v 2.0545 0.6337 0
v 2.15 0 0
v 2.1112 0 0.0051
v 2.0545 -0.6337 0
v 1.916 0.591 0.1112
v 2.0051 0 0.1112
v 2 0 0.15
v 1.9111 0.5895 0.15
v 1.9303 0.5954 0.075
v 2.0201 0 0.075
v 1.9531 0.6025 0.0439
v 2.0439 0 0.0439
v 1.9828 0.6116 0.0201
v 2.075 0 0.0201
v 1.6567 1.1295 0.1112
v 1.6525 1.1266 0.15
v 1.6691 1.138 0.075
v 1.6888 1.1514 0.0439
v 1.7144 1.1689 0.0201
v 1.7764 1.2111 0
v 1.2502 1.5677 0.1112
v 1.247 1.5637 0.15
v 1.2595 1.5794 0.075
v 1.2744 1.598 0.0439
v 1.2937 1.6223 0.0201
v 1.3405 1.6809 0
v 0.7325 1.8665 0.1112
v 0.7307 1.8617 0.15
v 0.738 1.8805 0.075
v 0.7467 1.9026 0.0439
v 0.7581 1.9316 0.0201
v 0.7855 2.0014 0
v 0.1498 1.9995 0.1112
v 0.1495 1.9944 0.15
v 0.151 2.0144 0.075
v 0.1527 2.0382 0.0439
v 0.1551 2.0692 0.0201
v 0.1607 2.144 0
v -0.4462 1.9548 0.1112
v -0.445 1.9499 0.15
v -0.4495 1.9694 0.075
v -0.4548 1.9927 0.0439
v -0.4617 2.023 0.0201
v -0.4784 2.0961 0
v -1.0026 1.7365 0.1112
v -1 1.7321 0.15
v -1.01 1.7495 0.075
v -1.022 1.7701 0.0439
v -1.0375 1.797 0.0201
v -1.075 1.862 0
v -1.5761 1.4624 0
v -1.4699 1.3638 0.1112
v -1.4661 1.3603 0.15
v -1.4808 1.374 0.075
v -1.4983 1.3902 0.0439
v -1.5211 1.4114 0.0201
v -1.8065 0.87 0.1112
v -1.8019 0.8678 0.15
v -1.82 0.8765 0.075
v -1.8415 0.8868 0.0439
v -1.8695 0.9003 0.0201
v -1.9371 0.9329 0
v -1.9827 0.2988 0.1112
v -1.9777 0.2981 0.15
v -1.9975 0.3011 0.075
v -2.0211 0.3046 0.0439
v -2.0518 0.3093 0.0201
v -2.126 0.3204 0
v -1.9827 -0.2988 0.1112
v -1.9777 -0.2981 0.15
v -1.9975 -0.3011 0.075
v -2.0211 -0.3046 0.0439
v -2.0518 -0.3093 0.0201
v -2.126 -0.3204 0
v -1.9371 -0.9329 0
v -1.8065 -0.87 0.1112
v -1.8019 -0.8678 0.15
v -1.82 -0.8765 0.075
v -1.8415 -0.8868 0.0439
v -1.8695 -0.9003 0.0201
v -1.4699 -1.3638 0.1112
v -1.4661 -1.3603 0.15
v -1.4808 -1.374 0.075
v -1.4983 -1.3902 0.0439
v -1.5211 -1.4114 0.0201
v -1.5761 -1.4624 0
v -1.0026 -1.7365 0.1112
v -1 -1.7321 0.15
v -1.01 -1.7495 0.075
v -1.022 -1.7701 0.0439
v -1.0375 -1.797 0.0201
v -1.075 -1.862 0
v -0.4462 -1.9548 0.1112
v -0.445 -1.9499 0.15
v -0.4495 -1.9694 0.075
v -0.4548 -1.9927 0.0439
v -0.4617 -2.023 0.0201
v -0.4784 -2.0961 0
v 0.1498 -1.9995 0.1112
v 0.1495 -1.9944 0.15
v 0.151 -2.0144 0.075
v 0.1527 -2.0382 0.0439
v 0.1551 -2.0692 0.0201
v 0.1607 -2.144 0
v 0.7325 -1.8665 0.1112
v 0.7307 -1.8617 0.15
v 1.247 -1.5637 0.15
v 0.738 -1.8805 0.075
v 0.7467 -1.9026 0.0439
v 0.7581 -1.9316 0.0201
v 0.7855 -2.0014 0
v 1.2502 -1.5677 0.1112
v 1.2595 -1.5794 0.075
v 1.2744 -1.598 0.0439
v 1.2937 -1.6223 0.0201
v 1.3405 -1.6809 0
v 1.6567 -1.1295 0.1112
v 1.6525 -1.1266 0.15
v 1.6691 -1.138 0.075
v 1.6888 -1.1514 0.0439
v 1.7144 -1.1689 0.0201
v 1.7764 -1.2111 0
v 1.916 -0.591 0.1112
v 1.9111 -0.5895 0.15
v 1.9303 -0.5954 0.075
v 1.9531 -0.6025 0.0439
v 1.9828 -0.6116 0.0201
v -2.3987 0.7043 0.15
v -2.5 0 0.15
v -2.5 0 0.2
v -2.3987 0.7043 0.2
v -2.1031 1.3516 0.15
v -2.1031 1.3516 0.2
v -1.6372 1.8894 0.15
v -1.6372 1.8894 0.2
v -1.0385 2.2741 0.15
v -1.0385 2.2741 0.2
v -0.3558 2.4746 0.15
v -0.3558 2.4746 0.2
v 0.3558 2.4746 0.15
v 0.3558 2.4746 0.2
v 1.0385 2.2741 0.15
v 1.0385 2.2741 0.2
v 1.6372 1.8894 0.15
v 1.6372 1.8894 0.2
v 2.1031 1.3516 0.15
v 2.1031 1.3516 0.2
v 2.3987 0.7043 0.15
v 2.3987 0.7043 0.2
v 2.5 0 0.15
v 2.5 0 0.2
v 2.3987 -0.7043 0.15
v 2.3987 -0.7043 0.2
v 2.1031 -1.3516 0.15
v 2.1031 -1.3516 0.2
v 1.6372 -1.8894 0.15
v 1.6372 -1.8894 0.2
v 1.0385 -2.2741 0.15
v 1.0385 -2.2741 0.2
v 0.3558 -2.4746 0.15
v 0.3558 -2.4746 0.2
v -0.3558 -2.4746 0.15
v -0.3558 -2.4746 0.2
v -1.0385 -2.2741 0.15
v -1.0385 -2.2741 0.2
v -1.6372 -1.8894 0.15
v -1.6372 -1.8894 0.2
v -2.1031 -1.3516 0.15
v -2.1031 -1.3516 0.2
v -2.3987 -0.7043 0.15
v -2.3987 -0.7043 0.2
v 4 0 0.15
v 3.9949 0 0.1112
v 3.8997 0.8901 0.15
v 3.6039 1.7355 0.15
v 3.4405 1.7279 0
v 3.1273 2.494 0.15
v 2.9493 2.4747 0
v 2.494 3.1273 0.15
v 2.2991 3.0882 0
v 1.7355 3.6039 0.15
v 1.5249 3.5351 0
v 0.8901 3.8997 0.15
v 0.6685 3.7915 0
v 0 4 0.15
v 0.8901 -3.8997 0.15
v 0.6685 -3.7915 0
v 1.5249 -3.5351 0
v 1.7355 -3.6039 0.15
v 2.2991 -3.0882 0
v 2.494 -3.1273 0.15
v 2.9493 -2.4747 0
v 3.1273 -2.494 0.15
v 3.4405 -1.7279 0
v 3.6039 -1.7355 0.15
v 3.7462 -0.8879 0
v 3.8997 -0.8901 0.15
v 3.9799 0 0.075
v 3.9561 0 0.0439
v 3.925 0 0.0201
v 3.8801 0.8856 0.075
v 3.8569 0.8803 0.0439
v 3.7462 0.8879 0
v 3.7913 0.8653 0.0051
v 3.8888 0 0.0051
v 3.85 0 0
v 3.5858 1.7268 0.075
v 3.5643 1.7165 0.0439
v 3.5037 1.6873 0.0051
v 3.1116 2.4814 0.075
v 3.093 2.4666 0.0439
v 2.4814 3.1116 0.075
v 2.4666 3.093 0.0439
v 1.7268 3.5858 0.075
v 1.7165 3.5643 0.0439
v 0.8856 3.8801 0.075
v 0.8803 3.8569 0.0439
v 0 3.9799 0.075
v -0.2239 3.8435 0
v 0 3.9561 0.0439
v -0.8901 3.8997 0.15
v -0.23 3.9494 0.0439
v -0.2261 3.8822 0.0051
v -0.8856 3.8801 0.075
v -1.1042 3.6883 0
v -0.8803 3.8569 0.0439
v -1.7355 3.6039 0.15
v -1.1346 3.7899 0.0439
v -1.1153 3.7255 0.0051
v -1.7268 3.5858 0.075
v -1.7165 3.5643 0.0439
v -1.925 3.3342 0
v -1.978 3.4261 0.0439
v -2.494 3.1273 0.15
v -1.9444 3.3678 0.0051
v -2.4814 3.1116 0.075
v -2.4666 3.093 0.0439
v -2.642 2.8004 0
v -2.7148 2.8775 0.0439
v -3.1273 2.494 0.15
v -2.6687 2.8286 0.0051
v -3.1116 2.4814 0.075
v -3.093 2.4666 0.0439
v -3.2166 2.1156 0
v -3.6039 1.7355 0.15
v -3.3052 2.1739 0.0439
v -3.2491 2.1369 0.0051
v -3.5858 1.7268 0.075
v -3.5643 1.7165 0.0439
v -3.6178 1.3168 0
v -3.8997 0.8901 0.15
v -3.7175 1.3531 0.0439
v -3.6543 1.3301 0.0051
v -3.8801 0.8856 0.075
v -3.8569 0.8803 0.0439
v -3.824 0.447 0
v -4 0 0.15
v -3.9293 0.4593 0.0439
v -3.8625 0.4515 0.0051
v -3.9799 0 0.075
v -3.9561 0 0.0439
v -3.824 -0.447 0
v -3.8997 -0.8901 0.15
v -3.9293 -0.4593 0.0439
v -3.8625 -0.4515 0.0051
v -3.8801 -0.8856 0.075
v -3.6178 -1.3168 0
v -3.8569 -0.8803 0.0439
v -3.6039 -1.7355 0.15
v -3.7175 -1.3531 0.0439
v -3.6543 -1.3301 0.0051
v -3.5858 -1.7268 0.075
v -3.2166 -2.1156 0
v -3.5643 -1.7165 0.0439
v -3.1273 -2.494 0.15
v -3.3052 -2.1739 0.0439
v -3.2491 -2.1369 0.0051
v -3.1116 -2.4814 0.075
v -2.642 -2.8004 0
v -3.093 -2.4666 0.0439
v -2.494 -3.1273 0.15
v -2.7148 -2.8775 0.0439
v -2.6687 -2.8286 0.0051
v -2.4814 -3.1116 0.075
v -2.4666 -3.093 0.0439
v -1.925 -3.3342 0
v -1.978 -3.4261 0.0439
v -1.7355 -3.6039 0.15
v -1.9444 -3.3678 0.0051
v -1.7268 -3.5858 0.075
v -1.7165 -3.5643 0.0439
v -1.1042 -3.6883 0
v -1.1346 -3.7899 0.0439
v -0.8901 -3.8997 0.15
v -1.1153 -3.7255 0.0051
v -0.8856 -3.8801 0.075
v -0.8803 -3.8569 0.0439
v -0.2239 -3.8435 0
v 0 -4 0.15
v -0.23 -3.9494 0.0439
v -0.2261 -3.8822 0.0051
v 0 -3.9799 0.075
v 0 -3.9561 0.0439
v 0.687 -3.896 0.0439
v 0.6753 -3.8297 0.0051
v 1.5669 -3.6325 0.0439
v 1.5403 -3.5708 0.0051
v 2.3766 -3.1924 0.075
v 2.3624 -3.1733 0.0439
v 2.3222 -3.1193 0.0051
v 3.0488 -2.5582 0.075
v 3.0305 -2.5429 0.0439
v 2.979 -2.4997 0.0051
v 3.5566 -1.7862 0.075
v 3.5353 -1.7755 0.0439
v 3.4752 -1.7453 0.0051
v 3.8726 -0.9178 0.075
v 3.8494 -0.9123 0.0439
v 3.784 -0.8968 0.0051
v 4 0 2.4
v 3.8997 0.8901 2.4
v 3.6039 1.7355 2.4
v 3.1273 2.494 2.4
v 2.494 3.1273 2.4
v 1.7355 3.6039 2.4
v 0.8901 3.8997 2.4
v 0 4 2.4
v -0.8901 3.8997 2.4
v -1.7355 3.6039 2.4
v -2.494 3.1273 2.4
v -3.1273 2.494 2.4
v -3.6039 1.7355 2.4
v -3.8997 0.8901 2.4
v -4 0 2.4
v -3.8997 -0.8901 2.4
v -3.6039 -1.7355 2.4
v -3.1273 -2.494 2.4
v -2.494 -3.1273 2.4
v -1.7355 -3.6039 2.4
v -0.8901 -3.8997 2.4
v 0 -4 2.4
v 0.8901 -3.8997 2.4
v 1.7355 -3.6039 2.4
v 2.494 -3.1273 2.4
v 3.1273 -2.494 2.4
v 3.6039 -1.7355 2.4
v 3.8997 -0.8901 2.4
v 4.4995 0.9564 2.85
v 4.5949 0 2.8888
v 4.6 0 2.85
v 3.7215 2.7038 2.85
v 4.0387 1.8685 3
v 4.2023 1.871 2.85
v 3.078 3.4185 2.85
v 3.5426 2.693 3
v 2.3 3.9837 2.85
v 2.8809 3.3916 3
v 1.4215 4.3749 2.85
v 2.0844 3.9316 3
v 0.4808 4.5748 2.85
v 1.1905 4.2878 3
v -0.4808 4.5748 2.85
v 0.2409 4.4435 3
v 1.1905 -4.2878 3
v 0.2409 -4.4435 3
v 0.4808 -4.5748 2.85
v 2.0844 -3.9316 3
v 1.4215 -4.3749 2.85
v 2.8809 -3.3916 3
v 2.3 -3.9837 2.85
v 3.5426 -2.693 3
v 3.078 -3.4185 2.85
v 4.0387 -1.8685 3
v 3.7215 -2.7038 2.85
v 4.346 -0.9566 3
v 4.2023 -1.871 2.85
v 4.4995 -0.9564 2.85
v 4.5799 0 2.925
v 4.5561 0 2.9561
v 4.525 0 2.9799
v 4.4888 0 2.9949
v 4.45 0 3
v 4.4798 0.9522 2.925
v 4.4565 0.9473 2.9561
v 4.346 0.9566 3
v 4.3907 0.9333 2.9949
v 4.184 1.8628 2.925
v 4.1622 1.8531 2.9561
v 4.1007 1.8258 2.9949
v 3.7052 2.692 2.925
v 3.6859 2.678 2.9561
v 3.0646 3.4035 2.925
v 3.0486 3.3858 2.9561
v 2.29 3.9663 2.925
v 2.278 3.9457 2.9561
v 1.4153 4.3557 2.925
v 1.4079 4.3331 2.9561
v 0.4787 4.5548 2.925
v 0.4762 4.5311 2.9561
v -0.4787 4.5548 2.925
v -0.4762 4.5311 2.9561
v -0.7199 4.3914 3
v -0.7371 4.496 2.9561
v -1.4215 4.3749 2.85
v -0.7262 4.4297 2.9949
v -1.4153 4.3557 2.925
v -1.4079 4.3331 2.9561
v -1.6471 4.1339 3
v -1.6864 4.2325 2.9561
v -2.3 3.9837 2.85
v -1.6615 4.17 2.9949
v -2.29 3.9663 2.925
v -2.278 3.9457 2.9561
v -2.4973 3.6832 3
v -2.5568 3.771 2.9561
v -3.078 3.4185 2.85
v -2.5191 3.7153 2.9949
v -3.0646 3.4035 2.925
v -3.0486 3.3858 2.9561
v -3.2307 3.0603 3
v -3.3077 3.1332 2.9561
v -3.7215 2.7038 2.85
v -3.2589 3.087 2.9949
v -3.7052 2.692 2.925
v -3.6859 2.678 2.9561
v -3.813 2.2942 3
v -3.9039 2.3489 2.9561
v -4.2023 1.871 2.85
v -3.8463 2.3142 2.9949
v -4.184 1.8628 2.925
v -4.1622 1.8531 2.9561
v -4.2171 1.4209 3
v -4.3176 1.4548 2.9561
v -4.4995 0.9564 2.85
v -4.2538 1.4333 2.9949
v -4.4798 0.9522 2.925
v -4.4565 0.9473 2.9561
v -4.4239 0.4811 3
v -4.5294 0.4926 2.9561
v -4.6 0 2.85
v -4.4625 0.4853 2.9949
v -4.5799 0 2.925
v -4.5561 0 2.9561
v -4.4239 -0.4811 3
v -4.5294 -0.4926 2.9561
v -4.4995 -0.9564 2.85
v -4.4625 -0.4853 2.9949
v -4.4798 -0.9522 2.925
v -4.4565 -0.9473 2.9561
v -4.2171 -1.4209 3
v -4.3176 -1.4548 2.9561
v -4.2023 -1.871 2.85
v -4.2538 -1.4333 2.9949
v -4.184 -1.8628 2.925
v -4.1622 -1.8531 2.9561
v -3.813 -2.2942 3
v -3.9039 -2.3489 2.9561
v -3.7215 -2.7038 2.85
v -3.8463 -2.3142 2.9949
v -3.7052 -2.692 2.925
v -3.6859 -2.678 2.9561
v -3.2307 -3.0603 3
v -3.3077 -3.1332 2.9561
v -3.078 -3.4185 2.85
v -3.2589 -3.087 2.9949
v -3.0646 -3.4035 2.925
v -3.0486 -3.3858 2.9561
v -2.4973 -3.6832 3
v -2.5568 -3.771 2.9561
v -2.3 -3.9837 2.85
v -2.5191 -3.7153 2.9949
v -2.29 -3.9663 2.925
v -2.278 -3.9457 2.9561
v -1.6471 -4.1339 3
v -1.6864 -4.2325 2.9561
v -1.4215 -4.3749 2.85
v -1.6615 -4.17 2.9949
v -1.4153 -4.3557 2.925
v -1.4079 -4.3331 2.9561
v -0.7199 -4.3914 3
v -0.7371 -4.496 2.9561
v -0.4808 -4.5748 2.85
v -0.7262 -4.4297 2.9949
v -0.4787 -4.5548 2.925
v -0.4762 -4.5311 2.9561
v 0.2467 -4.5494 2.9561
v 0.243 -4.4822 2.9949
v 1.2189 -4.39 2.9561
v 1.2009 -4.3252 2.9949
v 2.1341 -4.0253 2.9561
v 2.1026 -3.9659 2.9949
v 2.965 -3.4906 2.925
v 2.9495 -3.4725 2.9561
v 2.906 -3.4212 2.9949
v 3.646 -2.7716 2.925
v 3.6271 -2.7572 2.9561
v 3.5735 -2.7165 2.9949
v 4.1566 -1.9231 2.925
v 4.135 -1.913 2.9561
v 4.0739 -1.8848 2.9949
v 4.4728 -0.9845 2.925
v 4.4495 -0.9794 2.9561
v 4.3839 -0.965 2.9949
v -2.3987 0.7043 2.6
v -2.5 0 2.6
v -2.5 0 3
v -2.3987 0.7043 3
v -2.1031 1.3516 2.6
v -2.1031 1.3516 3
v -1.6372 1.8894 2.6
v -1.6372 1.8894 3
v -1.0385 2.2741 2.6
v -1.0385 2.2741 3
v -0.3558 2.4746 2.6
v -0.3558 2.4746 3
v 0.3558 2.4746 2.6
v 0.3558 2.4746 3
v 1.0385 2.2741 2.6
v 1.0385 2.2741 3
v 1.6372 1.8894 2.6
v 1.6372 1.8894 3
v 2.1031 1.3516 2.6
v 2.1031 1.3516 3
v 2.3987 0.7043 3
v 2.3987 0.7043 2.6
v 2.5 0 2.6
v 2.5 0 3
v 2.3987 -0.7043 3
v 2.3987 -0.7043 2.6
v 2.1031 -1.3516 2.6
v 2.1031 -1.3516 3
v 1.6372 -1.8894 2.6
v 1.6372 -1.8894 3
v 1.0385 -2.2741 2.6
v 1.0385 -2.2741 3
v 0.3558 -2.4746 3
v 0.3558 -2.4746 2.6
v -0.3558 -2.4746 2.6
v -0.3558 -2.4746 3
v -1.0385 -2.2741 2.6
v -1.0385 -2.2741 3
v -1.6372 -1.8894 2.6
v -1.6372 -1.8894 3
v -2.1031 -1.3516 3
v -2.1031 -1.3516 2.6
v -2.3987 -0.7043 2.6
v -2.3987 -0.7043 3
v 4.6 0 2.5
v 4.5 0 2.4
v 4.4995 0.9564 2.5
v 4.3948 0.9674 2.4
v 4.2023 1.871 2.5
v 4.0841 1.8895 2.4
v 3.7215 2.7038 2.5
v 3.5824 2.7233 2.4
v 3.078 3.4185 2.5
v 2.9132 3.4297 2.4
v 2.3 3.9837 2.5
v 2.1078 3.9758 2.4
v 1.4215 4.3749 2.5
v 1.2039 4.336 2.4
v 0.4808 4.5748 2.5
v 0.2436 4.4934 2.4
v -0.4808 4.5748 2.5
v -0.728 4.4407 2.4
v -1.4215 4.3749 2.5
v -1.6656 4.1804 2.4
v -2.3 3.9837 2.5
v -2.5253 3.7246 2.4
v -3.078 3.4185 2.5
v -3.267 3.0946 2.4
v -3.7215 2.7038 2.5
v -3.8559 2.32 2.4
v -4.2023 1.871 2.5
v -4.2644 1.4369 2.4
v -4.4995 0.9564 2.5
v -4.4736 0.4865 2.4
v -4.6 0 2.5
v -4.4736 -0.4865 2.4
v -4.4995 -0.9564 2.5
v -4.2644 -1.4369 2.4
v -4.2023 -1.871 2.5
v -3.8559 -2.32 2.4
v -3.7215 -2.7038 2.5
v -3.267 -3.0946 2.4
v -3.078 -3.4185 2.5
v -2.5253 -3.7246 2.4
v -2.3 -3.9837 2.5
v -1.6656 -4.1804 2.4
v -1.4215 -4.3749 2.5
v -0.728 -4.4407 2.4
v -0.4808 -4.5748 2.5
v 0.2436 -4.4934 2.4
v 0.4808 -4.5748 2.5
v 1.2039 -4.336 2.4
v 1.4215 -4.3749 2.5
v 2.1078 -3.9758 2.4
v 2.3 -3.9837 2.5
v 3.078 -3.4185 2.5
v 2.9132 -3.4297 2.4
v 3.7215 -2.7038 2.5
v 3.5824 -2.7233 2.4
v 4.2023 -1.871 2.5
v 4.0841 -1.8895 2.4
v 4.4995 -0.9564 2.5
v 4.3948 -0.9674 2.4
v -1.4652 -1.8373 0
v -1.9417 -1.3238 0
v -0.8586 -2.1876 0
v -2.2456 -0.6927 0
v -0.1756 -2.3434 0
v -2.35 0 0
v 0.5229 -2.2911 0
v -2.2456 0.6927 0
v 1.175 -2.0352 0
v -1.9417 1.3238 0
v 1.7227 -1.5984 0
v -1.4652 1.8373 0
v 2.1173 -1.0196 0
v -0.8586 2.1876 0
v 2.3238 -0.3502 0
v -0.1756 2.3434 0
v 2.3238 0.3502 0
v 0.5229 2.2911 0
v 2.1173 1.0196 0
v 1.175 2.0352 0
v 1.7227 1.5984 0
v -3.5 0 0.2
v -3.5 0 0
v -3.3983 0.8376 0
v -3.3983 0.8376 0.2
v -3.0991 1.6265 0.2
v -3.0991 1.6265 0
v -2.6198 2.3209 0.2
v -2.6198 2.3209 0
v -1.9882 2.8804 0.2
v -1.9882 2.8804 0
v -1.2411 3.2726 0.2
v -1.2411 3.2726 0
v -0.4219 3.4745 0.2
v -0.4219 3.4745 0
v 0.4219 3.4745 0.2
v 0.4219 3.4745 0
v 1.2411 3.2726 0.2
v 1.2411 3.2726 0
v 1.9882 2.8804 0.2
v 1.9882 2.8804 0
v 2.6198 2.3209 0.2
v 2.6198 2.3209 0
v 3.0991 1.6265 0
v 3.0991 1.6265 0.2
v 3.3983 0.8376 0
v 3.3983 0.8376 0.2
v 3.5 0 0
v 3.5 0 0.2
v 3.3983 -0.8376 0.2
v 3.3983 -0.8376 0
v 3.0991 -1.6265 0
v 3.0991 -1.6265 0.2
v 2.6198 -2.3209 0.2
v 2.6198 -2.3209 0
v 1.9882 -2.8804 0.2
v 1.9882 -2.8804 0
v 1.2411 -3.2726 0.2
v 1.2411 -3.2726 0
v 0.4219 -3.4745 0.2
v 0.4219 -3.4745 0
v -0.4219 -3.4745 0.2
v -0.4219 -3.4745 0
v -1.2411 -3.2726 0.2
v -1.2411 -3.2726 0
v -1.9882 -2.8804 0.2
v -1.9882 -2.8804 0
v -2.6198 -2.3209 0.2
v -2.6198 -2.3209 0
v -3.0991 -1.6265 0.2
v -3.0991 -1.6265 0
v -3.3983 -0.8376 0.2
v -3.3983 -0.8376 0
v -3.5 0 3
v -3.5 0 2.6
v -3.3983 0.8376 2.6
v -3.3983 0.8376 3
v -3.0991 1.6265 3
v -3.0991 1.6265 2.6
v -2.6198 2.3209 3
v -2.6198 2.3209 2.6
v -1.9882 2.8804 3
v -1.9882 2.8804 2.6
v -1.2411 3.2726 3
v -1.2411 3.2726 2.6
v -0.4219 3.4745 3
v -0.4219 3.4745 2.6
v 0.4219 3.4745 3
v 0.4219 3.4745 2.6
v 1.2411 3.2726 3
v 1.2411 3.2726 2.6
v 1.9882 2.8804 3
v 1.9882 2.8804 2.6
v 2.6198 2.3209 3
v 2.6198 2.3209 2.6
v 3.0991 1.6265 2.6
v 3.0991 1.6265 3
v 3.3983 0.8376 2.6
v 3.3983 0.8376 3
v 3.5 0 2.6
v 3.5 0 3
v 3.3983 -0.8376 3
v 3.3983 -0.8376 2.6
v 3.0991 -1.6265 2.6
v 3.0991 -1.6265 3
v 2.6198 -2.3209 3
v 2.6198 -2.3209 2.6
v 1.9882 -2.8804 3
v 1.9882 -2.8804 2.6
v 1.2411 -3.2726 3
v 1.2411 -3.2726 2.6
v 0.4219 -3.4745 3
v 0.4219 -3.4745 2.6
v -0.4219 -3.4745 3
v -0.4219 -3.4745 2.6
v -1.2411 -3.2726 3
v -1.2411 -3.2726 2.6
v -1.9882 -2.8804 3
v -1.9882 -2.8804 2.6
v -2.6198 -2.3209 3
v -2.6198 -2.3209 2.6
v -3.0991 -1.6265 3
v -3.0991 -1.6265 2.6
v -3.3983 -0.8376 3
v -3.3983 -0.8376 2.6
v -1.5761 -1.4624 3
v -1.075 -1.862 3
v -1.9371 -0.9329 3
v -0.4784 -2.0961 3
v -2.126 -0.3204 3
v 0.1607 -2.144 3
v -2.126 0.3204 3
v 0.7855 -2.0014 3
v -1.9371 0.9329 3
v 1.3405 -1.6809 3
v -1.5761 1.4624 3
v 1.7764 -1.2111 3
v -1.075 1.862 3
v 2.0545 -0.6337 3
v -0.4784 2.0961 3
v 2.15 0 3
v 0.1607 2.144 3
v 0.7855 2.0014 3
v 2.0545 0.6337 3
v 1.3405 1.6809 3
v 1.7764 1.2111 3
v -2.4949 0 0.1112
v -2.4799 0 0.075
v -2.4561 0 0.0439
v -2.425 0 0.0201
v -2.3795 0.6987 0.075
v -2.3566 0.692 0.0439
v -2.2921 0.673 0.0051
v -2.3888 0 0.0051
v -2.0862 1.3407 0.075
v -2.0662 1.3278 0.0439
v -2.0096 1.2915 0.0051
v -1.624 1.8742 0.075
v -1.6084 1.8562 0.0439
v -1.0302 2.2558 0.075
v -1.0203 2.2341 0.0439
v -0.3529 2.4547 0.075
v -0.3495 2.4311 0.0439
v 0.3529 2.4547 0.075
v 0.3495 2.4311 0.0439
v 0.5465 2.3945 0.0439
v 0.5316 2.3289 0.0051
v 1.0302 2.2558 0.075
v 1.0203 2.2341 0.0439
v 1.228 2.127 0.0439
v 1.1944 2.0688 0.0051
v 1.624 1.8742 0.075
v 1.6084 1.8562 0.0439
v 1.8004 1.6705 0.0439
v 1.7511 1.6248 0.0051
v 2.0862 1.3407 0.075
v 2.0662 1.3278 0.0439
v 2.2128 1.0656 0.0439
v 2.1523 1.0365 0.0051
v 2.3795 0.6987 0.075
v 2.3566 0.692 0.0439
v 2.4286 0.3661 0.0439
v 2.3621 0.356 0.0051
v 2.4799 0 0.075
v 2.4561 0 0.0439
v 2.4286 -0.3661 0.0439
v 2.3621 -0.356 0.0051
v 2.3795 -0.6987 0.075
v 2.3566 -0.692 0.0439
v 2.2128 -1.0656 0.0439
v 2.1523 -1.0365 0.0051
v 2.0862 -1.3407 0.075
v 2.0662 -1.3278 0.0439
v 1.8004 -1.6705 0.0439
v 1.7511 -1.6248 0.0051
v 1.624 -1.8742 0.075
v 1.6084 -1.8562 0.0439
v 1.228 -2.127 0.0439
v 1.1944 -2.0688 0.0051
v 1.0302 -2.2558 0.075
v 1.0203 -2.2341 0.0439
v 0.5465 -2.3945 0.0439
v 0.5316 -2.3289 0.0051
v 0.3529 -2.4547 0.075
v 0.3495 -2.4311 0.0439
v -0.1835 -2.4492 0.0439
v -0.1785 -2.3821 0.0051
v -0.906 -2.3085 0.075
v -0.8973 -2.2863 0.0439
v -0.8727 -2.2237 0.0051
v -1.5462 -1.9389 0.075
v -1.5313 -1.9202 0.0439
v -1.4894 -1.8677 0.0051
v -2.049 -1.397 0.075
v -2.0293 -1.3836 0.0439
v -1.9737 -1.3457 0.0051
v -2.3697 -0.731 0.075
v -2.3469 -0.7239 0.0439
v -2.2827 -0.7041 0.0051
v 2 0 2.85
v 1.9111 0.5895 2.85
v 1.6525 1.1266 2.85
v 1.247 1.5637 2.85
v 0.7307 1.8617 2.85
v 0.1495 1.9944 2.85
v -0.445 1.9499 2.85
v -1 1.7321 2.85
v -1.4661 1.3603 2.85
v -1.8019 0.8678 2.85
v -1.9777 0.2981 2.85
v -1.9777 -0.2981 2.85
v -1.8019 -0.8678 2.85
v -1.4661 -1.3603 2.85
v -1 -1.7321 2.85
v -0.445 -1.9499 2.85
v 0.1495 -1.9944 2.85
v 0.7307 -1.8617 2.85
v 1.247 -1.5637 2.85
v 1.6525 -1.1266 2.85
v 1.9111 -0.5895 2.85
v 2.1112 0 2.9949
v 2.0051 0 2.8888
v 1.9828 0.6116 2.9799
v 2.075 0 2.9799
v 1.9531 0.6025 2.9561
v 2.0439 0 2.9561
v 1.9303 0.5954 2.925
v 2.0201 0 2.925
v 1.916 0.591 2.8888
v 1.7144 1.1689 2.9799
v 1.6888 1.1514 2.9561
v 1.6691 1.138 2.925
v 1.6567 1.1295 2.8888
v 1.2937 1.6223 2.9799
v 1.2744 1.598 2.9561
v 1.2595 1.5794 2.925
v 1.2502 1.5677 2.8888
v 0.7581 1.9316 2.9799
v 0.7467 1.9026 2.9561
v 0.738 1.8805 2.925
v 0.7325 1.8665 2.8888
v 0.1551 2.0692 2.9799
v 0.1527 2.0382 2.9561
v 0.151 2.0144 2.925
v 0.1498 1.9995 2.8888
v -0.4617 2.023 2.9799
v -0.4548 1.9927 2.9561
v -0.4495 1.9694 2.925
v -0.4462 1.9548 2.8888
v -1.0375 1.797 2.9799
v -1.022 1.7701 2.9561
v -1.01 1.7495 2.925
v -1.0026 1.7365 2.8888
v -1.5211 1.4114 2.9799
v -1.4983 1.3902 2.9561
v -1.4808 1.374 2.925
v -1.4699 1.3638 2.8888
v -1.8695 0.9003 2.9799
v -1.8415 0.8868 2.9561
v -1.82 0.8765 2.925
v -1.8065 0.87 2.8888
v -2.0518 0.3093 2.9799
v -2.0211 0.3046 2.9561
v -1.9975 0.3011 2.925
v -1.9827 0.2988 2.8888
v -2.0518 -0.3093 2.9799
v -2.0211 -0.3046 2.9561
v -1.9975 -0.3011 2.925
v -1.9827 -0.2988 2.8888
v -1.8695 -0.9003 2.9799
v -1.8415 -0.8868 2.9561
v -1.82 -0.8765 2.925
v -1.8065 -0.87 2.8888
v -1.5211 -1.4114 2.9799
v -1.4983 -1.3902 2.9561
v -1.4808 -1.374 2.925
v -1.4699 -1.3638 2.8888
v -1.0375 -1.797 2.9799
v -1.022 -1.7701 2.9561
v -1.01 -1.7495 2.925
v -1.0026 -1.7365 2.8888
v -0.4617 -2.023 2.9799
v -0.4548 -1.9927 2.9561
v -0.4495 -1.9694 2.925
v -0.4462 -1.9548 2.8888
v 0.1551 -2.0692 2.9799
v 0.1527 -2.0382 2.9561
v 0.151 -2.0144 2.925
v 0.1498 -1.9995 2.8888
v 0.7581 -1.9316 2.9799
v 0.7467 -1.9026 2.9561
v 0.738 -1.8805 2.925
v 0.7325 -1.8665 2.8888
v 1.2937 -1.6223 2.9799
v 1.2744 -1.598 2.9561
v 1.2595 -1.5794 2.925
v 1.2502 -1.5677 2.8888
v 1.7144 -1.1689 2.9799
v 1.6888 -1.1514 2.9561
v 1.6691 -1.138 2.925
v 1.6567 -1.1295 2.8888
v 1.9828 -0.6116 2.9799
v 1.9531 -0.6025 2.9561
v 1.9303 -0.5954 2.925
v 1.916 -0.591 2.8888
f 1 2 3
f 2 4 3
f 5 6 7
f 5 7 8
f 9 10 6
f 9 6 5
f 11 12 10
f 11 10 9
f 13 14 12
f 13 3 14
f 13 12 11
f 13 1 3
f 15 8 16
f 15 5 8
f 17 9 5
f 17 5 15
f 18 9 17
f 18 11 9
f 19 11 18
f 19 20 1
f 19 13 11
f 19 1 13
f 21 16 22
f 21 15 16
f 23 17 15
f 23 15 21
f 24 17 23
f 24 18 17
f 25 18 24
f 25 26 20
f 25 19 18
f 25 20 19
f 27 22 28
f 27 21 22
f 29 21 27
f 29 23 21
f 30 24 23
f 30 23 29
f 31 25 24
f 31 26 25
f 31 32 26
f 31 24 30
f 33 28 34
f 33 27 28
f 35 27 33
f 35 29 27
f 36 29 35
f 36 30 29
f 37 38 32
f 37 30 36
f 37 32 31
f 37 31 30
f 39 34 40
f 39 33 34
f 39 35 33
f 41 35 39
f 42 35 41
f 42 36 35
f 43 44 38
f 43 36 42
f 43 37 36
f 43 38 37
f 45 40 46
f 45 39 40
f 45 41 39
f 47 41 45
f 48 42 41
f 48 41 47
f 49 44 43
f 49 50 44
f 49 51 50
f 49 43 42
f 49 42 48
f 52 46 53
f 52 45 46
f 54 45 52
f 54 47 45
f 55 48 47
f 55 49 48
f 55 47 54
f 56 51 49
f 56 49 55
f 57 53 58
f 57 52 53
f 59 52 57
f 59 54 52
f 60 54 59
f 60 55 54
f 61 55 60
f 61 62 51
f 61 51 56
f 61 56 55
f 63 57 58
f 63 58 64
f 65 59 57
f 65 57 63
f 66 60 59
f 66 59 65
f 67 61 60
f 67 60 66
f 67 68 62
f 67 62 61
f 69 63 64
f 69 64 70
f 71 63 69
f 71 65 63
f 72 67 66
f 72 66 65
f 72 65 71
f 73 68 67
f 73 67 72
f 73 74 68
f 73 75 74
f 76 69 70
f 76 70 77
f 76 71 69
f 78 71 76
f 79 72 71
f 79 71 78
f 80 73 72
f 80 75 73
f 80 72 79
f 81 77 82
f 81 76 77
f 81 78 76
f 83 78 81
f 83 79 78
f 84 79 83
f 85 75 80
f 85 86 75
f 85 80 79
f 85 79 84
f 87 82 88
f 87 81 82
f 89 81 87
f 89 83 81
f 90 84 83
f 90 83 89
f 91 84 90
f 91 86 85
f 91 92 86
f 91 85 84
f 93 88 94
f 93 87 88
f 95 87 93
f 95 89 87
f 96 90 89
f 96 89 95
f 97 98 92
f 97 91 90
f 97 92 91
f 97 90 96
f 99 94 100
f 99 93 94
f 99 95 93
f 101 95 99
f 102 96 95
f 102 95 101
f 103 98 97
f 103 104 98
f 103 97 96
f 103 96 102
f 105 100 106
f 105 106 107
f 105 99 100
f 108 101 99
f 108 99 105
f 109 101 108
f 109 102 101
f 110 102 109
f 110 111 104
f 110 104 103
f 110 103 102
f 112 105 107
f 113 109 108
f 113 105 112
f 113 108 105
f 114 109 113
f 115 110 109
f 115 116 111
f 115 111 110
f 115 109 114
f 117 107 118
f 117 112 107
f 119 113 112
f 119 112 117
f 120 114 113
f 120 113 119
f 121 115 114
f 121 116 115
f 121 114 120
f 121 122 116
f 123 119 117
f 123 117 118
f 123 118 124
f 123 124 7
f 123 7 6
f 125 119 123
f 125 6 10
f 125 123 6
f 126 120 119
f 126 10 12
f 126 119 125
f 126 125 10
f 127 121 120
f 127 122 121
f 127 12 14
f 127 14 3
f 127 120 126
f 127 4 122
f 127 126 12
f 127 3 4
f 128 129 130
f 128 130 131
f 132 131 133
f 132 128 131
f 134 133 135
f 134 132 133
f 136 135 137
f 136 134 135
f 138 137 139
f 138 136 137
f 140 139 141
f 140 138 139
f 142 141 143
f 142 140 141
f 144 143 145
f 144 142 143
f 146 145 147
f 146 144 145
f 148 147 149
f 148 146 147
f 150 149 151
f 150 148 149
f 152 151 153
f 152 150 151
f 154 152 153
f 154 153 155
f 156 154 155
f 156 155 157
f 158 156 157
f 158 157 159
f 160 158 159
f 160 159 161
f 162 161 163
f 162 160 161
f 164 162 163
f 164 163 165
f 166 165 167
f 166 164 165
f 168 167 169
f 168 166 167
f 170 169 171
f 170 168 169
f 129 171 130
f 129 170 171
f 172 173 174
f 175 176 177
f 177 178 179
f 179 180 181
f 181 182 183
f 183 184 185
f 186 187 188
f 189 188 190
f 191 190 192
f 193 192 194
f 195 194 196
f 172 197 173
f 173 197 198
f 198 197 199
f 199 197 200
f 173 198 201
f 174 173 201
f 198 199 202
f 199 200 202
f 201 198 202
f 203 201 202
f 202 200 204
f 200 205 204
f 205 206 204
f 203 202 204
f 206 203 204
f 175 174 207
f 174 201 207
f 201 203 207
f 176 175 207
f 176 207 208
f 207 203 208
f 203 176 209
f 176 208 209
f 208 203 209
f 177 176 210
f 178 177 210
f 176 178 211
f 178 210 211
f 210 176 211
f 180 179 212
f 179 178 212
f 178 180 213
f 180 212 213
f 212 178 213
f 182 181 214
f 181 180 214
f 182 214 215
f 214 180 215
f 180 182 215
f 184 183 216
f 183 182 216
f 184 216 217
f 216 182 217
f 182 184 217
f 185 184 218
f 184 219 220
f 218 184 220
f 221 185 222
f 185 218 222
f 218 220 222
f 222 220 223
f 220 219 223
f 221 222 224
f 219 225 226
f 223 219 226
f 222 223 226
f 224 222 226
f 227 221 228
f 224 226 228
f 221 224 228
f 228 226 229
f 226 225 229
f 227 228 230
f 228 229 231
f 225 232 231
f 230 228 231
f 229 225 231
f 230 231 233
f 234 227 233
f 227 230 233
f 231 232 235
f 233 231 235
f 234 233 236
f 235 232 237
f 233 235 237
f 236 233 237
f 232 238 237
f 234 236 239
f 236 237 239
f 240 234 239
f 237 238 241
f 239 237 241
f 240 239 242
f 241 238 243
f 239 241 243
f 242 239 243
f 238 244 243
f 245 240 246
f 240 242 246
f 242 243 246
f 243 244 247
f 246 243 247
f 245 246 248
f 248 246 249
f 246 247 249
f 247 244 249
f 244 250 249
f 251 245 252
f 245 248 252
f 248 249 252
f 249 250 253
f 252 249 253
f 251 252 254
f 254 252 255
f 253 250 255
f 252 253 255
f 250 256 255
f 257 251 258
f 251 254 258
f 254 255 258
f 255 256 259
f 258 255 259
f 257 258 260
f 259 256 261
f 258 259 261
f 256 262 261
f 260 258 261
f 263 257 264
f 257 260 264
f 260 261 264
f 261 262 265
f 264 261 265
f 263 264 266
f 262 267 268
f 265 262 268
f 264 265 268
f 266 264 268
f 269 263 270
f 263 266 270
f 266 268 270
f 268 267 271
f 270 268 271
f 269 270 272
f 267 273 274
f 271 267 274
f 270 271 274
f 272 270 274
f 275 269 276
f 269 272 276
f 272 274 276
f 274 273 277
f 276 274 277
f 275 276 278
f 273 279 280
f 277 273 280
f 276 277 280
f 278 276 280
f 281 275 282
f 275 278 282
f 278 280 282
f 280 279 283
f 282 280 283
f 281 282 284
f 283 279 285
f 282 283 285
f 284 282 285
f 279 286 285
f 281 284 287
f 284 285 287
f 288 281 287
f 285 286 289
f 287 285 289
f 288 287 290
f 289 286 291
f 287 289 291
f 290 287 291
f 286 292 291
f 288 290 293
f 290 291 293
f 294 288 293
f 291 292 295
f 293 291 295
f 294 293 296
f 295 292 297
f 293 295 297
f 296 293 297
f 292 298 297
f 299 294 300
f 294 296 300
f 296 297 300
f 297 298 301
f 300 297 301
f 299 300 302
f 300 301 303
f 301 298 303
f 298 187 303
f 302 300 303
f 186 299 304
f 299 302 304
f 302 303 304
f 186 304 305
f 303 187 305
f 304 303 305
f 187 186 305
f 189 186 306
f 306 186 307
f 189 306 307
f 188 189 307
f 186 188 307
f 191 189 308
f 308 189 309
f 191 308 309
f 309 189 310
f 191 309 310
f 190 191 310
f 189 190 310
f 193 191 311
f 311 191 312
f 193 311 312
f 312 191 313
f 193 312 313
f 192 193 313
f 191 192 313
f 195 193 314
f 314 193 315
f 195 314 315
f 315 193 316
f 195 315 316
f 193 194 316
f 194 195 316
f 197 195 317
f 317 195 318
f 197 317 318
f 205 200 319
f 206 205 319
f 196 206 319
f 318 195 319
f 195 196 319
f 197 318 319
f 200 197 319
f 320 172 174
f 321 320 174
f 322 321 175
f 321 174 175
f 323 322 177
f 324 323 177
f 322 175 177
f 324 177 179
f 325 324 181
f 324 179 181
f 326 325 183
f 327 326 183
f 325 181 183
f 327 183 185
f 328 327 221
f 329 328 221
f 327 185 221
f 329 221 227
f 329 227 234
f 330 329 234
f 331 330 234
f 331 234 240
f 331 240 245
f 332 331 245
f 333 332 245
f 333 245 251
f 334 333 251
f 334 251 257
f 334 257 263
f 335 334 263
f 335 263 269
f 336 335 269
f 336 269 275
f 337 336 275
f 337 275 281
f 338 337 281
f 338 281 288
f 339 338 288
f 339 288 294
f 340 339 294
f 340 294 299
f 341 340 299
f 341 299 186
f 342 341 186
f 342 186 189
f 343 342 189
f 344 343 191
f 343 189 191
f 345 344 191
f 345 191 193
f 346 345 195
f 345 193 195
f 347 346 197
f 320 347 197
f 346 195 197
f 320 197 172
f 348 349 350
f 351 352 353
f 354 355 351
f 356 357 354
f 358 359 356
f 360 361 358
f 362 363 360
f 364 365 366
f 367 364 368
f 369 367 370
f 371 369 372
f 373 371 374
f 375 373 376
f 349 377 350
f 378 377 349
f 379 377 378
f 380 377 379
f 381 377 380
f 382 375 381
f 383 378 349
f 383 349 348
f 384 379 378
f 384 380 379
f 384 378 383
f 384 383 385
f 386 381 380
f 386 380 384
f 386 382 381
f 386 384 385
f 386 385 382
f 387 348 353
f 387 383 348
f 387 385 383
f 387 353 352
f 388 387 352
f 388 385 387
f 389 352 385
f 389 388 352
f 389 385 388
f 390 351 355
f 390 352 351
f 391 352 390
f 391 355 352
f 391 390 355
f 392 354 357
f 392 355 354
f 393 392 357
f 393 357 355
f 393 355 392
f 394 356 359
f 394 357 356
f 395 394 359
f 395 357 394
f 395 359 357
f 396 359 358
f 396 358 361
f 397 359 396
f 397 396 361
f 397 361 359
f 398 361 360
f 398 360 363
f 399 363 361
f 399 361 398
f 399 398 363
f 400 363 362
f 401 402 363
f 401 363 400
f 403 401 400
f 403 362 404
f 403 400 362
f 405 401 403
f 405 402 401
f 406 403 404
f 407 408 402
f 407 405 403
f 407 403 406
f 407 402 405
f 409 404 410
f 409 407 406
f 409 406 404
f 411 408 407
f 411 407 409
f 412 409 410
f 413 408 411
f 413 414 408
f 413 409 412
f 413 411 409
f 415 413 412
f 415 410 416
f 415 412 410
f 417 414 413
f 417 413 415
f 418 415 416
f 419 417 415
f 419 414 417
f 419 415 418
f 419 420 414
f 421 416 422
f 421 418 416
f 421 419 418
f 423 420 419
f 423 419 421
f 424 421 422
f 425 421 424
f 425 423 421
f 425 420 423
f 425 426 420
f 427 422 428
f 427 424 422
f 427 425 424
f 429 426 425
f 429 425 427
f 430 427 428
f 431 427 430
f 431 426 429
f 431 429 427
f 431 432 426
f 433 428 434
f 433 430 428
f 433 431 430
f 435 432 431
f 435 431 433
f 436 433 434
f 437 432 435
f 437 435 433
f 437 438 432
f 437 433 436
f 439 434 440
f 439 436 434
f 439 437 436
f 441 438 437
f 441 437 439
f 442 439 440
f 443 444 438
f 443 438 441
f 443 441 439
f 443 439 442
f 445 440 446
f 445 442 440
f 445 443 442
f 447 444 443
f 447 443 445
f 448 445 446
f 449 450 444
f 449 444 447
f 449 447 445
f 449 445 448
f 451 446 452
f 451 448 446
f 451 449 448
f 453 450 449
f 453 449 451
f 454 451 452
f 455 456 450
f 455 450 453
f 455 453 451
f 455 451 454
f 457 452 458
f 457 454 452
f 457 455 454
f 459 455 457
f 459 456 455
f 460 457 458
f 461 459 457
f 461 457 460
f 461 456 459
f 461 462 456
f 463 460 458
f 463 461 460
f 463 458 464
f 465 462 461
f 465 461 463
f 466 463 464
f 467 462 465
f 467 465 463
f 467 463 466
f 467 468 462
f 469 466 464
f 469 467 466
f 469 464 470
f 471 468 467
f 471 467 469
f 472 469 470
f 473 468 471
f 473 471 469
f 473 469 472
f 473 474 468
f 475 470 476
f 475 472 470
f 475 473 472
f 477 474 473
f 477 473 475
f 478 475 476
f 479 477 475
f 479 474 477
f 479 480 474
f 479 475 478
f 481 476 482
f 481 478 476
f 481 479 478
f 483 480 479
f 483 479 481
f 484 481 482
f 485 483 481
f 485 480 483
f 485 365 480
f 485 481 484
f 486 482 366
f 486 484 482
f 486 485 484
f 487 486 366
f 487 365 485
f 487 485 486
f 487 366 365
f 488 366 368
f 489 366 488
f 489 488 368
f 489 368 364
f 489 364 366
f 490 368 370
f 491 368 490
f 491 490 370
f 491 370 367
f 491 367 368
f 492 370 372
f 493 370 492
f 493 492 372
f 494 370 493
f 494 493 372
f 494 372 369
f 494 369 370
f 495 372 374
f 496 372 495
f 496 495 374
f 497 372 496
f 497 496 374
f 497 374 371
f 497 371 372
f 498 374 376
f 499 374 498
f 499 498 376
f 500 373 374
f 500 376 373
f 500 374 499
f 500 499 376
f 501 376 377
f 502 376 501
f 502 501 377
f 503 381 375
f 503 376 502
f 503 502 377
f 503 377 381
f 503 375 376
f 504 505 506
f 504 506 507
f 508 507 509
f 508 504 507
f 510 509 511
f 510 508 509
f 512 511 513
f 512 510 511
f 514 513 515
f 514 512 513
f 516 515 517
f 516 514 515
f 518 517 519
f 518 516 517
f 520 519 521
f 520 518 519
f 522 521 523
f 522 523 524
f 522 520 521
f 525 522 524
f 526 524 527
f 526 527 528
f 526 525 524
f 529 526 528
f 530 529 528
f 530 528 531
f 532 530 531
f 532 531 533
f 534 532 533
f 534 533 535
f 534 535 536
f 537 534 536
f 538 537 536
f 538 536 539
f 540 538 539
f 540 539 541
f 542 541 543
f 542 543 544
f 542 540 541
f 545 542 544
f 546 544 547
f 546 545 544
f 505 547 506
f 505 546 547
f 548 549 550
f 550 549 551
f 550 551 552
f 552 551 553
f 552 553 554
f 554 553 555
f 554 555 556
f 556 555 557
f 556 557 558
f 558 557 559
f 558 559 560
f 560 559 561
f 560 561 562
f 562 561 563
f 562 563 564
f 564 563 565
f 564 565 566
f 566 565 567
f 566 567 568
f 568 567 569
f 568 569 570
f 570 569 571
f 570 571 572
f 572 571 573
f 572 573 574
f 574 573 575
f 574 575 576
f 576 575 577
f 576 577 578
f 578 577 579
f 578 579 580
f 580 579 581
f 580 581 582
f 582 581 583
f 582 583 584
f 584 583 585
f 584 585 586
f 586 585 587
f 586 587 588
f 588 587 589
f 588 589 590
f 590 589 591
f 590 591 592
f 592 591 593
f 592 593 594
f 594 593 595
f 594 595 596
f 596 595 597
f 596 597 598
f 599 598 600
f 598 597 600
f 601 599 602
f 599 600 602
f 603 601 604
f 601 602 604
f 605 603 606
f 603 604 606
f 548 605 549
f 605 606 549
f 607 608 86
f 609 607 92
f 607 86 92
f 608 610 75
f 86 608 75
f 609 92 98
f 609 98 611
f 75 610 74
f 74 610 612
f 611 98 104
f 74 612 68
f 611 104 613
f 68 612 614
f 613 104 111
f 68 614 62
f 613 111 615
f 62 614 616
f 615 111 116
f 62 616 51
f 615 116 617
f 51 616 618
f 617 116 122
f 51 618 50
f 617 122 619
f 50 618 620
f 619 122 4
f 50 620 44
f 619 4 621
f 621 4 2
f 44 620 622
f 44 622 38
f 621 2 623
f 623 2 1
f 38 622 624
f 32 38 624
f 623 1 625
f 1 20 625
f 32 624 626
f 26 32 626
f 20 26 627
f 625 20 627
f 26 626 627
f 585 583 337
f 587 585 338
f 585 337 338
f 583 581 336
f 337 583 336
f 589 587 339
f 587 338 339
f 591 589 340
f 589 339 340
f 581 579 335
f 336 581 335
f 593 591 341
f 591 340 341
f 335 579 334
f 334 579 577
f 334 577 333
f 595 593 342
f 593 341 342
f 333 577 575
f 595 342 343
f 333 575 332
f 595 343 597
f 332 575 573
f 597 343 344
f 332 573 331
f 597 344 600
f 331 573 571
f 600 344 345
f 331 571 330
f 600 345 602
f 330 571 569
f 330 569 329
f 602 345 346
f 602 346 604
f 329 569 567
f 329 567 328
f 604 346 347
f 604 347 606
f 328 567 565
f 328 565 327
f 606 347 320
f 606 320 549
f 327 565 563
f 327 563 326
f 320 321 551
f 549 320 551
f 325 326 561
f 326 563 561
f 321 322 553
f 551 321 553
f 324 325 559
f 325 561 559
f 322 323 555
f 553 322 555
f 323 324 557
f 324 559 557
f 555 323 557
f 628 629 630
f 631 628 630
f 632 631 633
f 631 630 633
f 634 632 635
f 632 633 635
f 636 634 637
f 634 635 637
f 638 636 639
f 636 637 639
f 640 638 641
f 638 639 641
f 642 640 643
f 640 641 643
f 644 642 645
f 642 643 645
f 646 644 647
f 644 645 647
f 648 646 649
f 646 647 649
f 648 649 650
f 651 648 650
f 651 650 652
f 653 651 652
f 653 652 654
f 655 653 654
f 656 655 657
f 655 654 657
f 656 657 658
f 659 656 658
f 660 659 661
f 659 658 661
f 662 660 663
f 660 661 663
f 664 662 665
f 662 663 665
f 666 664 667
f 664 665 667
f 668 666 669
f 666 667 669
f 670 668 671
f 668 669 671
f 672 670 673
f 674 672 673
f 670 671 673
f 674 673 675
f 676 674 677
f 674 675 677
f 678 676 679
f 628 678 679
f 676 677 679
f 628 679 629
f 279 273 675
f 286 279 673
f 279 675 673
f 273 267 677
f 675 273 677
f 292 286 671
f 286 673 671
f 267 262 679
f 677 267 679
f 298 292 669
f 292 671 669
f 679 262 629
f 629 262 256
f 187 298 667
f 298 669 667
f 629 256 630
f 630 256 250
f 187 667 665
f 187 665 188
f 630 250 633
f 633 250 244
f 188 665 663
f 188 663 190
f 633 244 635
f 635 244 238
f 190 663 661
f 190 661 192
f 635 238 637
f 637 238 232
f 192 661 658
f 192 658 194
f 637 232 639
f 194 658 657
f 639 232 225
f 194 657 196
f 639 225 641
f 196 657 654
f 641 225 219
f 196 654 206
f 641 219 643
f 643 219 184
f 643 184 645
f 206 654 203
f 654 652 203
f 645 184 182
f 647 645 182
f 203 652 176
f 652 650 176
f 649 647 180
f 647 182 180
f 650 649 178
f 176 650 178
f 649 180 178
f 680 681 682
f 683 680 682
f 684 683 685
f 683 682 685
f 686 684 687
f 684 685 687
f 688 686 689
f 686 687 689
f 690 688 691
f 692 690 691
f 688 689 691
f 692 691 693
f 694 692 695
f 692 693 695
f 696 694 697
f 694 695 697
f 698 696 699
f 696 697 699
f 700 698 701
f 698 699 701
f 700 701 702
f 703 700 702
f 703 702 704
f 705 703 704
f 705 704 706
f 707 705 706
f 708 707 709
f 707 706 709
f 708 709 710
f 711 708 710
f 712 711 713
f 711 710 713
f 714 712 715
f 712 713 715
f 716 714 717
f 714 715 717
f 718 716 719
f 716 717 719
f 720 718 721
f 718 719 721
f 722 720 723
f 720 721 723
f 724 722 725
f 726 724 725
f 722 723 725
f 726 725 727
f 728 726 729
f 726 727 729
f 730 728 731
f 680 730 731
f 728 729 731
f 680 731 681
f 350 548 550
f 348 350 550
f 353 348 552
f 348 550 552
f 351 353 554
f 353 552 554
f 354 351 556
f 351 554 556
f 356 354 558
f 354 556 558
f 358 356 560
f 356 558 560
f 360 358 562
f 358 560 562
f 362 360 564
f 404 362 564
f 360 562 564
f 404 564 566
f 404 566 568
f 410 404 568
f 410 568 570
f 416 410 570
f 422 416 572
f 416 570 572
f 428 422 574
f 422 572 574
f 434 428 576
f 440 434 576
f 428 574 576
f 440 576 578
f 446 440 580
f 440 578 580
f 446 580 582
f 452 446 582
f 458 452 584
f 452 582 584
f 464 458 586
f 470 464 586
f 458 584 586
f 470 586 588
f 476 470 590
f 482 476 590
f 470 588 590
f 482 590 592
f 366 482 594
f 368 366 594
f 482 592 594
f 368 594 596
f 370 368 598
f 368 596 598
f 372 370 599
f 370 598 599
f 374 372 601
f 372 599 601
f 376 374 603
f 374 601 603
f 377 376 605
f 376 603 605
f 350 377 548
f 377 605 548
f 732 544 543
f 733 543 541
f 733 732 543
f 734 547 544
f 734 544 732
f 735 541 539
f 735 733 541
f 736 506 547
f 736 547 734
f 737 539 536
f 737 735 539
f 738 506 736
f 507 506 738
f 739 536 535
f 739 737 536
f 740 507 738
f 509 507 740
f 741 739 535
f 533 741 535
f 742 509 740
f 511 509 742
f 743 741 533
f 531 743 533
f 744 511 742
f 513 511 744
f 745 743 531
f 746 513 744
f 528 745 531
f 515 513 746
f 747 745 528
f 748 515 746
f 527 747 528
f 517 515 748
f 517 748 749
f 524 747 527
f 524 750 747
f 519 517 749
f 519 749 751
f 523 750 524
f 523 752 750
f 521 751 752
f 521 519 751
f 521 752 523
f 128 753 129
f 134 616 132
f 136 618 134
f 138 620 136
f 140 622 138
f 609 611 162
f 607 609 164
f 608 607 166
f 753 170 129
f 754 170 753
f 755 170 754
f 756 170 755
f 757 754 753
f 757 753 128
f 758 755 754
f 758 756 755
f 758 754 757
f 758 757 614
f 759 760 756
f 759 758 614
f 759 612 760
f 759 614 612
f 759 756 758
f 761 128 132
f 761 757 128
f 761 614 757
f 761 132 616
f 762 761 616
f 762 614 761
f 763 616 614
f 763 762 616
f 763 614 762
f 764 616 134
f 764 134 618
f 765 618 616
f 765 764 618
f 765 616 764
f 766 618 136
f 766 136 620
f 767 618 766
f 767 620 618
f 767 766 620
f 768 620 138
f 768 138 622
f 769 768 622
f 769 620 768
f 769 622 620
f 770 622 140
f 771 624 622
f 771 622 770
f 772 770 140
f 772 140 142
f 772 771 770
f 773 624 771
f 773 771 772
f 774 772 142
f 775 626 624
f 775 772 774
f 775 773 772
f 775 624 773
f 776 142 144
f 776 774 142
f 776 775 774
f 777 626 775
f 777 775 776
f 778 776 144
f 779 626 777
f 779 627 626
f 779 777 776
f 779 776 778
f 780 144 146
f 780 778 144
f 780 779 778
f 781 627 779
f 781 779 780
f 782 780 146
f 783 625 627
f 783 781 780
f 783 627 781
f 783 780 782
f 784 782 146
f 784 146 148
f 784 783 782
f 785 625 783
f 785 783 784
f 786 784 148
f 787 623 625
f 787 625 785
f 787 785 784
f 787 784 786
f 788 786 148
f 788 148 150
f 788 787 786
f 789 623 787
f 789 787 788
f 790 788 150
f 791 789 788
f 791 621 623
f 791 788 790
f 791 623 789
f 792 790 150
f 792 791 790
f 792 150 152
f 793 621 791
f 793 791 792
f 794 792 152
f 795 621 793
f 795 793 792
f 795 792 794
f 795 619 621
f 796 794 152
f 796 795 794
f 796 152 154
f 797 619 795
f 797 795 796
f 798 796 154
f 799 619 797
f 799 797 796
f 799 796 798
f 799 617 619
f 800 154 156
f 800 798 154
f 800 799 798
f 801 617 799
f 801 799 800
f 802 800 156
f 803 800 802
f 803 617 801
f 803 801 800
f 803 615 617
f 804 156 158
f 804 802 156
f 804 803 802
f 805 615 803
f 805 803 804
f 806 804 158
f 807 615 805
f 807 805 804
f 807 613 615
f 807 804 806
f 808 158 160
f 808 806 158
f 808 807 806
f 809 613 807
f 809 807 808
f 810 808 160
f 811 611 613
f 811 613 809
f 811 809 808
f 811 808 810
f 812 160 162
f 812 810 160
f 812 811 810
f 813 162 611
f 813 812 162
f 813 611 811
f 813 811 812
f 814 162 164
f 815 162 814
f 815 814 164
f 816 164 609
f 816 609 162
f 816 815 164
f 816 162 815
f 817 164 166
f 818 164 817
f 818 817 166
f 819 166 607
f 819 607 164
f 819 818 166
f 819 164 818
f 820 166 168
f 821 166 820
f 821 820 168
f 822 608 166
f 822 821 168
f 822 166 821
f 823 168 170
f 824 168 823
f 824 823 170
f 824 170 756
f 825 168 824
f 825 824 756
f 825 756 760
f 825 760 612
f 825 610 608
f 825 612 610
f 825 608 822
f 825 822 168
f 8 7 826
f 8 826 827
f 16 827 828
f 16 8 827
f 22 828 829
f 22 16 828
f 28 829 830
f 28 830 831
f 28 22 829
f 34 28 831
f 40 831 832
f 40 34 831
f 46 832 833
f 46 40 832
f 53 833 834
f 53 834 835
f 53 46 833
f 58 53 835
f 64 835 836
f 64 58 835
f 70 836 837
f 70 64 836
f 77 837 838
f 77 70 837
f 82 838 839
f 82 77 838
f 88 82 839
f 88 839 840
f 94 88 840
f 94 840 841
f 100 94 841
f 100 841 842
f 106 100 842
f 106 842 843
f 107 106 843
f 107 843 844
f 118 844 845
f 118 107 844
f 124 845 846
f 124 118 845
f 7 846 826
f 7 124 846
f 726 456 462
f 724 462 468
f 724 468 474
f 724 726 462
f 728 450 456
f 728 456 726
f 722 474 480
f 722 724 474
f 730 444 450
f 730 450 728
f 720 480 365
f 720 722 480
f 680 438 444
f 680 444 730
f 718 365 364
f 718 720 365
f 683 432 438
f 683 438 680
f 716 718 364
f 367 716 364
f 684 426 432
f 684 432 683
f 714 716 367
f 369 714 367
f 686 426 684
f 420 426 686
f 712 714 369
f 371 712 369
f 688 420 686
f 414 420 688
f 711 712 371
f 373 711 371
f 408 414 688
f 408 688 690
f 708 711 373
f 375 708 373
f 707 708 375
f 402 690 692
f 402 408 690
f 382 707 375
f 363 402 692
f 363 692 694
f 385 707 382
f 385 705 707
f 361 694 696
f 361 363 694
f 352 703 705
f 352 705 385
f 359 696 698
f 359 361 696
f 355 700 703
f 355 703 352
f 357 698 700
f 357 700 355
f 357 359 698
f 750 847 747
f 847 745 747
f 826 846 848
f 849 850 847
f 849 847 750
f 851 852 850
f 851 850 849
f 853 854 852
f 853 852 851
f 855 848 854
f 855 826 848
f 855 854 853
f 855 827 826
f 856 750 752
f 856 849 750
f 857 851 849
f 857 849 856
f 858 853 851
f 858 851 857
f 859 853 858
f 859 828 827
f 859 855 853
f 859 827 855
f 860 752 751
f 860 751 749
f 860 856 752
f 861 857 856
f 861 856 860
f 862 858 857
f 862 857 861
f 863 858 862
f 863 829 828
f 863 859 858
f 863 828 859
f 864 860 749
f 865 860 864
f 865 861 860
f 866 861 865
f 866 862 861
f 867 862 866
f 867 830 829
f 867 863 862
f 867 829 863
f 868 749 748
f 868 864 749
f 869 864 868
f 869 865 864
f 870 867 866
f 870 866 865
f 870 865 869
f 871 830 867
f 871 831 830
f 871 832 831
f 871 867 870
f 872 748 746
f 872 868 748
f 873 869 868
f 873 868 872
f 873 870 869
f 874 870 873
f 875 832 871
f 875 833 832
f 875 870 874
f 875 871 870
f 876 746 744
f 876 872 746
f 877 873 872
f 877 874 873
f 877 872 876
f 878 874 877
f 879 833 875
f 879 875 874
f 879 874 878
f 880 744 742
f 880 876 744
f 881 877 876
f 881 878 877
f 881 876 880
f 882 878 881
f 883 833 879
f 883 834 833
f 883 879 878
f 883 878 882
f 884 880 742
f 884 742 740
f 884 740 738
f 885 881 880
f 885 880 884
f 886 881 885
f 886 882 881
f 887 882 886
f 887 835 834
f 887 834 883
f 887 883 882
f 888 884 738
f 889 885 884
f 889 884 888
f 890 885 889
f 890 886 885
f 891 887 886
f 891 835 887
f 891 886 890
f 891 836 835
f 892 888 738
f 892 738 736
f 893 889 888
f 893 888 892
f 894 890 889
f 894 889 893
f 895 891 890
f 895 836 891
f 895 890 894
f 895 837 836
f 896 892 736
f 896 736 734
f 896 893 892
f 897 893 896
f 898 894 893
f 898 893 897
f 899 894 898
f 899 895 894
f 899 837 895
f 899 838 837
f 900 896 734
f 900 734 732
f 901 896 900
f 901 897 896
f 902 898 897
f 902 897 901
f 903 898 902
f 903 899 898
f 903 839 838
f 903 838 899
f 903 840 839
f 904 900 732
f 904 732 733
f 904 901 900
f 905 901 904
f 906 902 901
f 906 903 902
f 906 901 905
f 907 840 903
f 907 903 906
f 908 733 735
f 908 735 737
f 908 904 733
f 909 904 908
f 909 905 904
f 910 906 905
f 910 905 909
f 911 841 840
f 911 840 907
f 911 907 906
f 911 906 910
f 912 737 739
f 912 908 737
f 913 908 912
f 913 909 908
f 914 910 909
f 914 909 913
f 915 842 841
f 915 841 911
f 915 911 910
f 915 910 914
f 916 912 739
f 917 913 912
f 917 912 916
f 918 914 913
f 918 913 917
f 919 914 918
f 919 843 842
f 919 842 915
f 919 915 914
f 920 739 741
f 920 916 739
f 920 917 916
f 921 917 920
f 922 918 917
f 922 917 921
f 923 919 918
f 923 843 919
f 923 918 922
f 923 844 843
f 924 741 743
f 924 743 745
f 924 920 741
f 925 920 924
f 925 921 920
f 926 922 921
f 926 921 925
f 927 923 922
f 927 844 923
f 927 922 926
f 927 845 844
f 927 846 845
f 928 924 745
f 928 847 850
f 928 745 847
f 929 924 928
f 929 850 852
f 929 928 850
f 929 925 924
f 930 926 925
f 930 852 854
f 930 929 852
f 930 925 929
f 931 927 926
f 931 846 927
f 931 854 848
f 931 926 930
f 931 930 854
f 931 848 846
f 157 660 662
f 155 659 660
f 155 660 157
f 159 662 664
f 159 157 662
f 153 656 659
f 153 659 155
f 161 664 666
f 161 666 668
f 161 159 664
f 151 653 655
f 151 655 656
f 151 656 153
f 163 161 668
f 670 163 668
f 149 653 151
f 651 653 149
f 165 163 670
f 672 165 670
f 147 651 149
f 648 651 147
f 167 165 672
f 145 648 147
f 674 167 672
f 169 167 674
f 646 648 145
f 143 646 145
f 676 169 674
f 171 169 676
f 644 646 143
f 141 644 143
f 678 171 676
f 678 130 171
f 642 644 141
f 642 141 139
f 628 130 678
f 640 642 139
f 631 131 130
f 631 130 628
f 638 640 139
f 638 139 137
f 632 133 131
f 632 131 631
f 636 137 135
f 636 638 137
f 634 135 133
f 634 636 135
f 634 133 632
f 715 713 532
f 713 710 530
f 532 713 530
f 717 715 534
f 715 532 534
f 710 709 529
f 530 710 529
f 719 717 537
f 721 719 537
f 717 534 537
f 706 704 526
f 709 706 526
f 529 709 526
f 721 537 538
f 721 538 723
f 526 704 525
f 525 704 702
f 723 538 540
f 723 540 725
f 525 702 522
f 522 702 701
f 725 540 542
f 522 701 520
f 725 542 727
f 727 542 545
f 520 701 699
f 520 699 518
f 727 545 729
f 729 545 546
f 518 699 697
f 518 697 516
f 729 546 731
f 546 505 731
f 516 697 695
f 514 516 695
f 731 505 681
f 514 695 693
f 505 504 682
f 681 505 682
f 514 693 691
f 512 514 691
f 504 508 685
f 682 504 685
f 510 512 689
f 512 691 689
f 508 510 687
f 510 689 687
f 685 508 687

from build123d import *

# Parameters (mm, degrees)
SKETCH1_R           = 4
SKETCH1_R_2         = 2
BOSS_EXTRUDE1_DEPTH = 3
BOSS_EXTRUDE2_START = -0.6
SKETCH2_R           = 4.6
SKETCH2_R_2         = 4
BOSS_EXTRUDE2_DEPTH = 0.6
SKETCH3_R           = 3.5
SKETCH3_R_2         = 2.5
CUT_EXTRUDE1_DEPTH  = 0.2
CUT_EXTRUDE2_START  = -2.6
SKETCH3_2_R         = 3.5
SKETCH3_2_R_2       = 2.5
CUT_EXTRUDE2_DEPTH  = 0.4
FILLET1_R           = 0.15
CHAMFER1_SIZE       = 0.1


with BuildPart() as part:
    # Sketch1 → Boss-Extrude1 (new body)
    with BuildSketch(Plane.XY):
        Circle(SKETCH1_R)
        Circle(SKETCH1_R_2, mode=Mode.SUBTRACT)
    extrude(amount=BOSS_EXTRUDE1_DEPTH)

    # Sketch2 → Boss-Extrude2 (add)
    with BuildSketch(Plane.XY.offset(3).offset(BOSS_EXTRUDE2_START)):
        Circle(SKETCH2_R)
        Circle(SKETCH2_R_2, mode=Mode.SUBTRACT)
    extrude(amount=BOSS_EXTRUDE2_DEPTH)

    # Sketch3 → Cut-Extrude1 (cut)
    with BuildSketch(Plane(origin=(0, 0, 0), x_dir=(-1, 0, 0), z_dir=(0, 0, -1))):
        Circle(SKETCH3_R)
        Circle(SKETCH3_R_2, mode=Mode.SUBTRACT)
    extrude(amount=-CUT_EXTRUDE1_DEPTH, mode=Mode.SUBTRACT)

    # Sketch3<2> → Cut-Extrude2 (cut)
    with BuildSketch(Plane(origin=(0, 0, 0), x_dir=(-1, 0, 0), z_dir=(0, 0, -1)).offset(CUT_EXTRUDE2_START)):
        Circle(SKETCH3_2_R)
        Circle(SKETCH3_2_R_2, mode=Mode.SUBTRACT)
    extrude(amount=-CUT_EXTRUDE2_DEPTH, mode=Mode.SUBTRACT)

    # Fillet1
    fillet1_edges = [part.edges().sort_by_distance(p)[0] for p in [
        (-4.6, 0, 3),
        (2.5, 0, 0),
        (-4, 0, 0),
        (-2, 0, 0),
        (-2, 0, 3),
    ]]
    fillet(fillet1_edges, radius=FILLET1_R)

    # Chamfer1
    chamfer1_edges = [part.edges().sort_by_distance(p)[0] for p in [
        (-4.6, 0, 2.4),
    ]]
    chamfer(chamfer1_edges, length=CHAMFER1_SIZE)


solid = part.part
